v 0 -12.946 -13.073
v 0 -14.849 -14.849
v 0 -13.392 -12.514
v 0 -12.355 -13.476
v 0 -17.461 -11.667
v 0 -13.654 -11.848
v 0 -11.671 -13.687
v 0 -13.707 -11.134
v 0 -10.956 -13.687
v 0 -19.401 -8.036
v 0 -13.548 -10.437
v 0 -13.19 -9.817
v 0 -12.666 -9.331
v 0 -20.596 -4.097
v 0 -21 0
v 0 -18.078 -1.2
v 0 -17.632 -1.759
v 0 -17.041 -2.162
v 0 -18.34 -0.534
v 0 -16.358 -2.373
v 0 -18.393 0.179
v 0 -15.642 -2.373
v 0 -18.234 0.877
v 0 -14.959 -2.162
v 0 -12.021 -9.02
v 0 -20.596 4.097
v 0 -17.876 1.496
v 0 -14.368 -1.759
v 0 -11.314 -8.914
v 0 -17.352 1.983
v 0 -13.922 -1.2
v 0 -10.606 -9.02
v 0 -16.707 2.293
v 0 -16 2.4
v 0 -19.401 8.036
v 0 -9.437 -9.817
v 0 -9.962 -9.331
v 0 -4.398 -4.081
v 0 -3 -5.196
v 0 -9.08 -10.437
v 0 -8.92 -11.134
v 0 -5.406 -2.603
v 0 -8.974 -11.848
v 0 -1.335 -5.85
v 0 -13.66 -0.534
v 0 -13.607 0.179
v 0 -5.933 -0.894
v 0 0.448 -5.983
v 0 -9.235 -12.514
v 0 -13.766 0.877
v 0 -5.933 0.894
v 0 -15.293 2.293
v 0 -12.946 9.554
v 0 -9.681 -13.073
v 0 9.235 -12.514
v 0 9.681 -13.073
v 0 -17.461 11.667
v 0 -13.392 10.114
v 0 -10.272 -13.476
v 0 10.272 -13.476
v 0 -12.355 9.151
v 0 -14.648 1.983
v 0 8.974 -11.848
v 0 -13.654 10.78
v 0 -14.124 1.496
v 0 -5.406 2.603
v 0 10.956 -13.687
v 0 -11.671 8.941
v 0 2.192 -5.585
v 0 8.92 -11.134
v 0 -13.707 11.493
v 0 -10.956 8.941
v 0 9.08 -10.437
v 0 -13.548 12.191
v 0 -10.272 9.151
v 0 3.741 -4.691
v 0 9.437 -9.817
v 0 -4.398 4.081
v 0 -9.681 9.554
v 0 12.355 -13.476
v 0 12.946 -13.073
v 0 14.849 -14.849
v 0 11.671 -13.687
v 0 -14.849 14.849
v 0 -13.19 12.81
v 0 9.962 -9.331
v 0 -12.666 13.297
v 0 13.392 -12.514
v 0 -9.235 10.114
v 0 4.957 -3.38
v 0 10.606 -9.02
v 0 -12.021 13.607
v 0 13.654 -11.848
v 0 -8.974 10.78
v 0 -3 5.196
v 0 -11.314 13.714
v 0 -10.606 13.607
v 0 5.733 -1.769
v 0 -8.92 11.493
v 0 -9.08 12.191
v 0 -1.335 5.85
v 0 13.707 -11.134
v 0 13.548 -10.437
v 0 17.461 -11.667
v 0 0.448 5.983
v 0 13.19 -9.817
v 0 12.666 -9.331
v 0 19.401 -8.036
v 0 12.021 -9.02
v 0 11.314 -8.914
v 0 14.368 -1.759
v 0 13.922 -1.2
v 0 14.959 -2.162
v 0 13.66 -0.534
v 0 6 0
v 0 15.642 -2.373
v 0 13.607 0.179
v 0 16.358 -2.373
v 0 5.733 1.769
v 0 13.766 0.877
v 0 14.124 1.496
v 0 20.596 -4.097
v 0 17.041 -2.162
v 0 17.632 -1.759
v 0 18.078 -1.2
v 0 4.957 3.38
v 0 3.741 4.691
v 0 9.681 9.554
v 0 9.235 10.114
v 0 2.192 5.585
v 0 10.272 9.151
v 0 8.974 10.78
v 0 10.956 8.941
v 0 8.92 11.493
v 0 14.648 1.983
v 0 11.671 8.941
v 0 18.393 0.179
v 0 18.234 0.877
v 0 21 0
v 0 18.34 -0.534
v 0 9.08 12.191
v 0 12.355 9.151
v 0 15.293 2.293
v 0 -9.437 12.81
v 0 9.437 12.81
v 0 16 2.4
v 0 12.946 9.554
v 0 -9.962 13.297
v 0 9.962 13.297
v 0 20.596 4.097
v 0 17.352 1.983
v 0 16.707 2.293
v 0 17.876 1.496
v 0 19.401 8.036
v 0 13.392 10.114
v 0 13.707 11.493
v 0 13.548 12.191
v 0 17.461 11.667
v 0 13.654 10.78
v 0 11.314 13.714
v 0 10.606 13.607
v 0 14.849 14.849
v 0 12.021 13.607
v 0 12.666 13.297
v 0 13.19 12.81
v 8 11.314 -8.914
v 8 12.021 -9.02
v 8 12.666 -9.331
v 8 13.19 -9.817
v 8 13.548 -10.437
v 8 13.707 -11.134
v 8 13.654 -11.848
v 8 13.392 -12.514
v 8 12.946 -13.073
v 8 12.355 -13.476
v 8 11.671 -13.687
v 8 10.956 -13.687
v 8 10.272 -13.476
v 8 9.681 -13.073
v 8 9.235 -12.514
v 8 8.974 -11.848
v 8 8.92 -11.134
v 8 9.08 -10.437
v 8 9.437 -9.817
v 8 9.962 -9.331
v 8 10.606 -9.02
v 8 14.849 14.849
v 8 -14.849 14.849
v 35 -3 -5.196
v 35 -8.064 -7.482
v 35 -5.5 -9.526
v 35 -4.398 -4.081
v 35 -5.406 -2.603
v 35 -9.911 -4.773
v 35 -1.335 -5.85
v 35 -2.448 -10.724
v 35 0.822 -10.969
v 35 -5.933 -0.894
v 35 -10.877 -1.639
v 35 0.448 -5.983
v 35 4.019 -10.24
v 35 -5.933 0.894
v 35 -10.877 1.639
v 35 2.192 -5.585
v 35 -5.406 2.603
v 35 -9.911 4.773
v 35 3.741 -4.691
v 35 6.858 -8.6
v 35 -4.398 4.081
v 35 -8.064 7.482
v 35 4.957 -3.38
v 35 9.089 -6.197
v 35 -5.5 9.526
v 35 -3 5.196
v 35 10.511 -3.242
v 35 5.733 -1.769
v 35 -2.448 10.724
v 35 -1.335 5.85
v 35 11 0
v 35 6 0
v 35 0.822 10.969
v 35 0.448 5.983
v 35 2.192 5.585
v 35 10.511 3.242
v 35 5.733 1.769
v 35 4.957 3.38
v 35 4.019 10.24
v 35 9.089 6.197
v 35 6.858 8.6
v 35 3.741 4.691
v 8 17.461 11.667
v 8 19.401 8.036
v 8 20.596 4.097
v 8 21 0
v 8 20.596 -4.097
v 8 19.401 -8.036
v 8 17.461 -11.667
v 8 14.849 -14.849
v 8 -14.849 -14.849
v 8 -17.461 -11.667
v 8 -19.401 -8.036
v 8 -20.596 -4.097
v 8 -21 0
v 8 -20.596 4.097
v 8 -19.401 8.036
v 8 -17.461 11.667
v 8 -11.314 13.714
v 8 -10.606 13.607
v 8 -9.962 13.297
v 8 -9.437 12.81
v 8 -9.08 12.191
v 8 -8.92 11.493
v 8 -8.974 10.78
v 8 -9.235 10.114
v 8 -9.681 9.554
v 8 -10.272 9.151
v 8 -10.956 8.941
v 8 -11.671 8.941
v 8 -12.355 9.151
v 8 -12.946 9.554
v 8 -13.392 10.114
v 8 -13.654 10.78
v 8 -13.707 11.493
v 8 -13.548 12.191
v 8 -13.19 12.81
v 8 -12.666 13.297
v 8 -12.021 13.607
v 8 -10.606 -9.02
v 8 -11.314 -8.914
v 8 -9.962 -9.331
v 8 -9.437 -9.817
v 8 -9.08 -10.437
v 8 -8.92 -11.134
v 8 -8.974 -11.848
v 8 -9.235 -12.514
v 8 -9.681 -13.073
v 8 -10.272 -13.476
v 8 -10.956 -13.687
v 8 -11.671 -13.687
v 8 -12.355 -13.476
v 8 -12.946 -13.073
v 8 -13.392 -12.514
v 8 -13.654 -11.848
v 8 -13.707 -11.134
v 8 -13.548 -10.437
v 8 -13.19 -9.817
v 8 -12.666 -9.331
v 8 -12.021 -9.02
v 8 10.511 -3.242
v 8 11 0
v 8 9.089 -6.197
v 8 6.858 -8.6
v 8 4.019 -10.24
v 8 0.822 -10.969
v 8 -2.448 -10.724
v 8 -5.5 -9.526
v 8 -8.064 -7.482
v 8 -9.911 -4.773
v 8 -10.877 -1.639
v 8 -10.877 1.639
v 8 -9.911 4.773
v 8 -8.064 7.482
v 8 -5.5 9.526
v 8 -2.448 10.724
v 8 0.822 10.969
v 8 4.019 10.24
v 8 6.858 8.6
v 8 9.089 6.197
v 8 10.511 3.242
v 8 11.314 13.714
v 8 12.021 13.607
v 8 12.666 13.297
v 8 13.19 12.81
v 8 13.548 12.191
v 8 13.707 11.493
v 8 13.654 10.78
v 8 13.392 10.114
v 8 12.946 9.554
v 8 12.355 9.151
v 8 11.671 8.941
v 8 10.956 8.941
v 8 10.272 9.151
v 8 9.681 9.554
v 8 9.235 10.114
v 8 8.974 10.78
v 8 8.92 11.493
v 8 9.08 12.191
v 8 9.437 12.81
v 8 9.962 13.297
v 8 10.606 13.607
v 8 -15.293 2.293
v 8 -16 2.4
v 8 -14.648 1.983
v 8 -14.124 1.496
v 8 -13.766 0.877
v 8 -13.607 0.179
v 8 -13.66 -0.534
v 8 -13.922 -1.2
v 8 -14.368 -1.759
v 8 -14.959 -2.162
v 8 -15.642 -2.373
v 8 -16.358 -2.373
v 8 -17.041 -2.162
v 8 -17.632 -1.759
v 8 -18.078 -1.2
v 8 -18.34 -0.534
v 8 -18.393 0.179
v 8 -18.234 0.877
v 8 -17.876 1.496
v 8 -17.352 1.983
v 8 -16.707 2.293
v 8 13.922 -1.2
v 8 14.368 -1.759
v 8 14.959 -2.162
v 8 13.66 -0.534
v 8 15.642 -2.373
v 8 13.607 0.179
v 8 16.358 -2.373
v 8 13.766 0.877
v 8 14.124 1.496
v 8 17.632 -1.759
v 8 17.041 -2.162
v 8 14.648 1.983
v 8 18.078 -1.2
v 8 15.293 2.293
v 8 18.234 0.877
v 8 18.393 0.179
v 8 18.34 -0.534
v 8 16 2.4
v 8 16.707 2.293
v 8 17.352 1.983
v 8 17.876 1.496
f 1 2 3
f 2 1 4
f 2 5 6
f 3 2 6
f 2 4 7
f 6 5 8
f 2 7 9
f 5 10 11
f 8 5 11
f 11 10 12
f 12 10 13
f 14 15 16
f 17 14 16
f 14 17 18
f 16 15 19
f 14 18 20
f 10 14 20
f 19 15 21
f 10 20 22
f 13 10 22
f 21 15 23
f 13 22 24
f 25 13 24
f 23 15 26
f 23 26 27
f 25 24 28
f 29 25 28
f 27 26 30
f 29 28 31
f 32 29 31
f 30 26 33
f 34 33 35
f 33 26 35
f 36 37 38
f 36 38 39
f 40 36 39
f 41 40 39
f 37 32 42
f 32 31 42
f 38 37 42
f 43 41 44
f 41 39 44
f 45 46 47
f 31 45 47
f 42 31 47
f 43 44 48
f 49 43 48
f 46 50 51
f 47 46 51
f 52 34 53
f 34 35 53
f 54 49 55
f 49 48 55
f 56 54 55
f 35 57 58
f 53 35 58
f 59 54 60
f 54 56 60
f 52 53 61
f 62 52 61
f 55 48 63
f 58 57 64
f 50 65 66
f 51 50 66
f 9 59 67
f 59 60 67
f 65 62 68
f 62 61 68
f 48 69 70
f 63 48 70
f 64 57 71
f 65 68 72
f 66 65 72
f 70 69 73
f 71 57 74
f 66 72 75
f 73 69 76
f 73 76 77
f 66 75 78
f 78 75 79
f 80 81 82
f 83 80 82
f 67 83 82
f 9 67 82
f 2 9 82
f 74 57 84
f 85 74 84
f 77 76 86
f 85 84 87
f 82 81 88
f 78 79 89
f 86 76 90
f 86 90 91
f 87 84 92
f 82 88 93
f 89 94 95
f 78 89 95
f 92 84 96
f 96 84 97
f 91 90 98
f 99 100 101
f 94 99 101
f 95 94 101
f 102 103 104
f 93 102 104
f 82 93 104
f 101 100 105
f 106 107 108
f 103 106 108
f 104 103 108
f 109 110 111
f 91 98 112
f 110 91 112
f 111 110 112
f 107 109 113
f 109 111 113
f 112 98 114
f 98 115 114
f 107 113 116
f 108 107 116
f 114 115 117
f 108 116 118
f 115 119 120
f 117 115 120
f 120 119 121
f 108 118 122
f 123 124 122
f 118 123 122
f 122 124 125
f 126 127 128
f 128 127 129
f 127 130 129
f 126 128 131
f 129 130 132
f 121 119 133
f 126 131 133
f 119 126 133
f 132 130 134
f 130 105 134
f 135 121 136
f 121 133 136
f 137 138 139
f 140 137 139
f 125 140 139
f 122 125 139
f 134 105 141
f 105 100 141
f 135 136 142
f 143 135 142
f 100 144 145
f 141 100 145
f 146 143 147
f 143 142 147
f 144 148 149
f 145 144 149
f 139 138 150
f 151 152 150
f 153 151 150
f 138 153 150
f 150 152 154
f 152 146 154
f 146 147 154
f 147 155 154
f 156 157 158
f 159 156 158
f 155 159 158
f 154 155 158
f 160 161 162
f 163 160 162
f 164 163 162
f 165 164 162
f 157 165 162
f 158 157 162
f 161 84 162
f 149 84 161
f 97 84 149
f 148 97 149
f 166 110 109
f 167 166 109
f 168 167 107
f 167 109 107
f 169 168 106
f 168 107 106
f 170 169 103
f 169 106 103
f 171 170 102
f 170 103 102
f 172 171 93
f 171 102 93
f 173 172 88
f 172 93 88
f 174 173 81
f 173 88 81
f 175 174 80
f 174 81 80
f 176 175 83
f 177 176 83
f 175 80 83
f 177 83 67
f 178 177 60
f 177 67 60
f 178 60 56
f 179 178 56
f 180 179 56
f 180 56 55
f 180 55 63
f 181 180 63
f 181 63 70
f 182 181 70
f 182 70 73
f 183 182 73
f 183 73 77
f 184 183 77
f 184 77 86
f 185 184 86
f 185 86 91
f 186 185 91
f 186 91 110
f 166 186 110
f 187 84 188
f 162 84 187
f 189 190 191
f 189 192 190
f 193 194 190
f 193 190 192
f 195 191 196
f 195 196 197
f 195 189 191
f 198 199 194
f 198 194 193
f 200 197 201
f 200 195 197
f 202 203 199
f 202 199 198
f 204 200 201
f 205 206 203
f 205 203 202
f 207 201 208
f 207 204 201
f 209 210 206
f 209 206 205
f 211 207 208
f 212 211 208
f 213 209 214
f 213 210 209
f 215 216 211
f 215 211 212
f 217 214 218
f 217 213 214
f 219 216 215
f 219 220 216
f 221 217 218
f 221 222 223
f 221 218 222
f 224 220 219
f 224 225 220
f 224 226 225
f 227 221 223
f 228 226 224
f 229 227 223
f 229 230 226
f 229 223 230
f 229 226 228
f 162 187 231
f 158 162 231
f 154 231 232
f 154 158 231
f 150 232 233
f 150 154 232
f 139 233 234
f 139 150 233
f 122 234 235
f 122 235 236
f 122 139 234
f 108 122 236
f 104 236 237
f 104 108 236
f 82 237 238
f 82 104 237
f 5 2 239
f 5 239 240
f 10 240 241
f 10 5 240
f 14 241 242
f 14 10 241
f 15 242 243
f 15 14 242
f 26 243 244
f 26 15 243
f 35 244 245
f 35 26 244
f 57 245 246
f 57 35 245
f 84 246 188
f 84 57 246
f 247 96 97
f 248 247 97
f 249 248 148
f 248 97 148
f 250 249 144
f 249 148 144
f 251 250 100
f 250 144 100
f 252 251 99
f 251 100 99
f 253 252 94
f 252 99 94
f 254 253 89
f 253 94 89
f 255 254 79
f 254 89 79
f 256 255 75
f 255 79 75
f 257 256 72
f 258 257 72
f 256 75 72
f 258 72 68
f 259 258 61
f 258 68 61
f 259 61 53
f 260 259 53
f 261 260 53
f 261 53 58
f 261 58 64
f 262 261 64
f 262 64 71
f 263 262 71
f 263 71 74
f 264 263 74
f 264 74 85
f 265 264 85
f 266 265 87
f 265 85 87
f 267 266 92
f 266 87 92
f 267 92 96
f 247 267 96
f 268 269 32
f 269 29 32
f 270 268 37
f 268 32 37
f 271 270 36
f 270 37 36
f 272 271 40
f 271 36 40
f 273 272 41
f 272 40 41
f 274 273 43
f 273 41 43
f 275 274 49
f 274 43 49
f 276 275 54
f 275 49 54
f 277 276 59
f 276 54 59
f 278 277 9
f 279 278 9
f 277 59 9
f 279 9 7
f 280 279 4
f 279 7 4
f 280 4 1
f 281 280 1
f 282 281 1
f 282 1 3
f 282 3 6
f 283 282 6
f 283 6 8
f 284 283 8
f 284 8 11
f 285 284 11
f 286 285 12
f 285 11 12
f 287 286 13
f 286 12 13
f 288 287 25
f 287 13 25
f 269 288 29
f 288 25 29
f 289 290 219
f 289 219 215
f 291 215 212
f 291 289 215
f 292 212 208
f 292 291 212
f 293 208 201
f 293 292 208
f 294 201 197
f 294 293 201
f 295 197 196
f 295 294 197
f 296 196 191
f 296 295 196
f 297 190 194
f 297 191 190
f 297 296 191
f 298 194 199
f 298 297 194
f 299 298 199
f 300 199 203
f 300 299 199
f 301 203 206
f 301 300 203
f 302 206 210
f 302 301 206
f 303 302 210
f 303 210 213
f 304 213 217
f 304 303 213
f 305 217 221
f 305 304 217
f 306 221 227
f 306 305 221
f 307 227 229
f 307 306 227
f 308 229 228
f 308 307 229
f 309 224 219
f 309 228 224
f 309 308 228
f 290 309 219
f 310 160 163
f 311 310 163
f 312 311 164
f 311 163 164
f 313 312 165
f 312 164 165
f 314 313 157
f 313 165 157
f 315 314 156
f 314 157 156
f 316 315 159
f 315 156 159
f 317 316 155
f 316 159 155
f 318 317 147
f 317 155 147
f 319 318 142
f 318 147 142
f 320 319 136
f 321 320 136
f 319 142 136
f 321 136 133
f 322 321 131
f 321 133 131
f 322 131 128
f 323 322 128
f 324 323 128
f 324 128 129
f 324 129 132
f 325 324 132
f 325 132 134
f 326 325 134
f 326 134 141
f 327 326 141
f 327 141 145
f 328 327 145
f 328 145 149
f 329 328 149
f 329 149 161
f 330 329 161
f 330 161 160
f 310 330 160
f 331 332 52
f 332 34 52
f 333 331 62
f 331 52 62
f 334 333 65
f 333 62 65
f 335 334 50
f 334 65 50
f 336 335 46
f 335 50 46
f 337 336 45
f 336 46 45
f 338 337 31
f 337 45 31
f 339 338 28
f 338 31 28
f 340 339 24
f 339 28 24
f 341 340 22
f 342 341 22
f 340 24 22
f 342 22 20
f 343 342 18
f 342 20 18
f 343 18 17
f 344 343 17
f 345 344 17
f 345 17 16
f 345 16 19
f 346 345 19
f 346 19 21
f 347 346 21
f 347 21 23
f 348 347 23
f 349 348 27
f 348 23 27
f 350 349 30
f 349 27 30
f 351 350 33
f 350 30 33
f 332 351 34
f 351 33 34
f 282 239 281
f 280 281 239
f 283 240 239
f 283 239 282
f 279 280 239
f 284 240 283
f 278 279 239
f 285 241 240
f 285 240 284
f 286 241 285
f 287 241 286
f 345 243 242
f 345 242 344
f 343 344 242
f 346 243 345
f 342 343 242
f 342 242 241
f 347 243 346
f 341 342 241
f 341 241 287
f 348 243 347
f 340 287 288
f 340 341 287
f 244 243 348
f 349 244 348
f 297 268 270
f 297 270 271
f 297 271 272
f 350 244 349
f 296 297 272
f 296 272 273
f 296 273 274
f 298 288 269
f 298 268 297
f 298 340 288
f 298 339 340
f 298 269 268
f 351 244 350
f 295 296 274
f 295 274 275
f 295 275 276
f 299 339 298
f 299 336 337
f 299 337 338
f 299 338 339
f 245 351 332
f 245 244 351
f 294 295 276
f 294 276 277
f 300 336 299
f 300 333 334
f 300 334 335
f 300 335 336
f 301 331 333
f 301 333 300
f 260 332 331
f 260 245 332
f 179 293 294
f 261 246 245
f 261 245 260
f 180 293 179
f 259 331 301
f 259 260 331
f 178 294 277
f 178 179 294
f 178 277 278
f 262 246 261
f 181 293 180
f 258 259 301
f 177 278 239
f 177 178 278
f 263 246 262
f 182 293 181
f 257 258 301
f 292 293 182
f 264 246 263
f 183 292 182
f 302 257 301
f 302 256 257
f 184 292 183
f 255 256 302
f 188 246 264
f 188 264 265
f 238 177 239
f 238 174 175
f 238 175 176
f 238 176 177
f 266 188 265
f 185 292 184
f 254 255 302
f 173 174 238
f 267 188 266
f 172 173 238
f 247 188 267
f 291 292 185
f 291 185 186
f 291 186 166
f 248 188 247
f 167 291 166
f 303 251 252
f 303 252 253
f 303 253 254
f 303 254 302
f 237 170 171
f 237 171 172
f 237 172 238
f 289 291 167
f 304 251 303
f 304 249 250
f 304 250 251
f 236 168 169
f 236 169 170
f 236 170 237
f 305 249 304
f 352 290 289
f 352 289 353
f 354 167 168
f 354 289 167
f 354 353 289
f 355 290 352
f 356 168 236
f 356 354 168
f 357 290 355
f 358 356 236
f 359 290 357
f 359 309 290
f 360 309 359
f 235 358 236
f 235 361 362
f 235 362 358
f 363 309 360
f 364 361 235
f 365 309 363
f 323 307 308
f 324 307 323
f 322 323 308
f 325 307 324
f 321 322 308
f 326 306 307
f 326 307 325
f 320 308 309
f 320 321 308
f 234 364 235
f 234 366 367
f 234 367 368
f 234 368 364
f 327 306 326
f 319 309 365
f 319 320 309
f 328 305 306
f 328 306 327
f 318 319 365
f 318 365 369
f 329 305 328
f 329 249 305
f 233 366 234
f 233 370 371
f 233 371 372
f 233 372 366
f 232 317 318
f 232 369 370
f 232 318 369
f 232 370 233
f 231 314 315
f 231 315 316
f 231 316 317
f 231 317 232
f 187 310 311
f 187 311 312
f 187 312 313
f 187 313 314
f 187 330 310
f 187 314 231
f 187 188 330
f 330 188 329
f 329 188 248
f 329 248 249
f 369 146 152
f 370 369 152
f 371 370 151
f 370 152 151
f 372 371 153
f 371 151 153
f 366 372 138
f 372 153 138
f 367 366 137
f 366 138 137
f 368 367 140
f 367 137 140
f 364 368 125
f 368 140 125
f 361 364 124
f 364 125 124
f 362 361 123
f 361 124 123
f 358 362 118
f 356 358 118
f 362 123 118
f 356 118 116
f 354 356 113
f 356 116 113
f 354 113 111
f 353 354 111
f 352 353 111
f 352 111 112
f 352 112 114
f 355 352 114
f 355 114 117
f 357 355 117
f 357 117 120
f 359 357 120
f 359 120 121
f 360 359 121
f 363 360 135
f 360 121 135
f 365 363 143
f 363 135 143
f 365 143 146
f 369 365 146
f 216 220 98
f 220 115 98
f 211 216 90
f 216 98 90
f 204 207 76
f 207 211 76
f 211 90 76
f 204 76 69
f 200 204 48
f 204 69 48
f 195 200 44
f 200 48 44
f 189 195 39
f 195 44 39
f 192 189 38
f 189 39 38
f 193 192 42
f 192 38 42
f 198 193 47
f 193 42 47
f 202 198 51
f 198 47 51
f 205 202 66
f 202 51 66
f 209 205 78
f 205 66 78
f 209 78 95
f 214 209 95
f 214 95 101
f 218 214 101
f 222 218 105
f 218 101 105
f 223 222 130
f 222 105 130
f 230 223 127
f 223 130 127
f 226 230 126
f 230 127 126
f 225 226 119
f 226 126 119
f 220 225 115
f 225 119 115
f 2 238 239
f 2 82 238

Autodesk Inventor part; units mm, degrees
ref_plane "YZ Plane" through (0, 0, 0) normal (1, 0, 0) x (0, 1, 0)
ref_plane "XZ Plane" through (0, 0, 0) normal (0, 1, 0) x (-1, 0, 0)
ref_plane "XY Plane" through (0, 0, 0) normal (0, 0, 1) x (1, 0, 0)
sketch "Sketch1" plane through (0, 0, 0) normal (0, 0, 1) x (1, 0, 0)
  line L0 (0, 21) -> (0, 6)
  line L1 (0, 0) -> (35, 0) construction
  line L2 (35, 0) -> (35, 6) construction
  line L3 (35, 11) -> (8, 11)
  line L4 (8, 11) -> (8, 21)
  line L5 (8, 21) -> (0, 21)
  line L6 (35, 6) -> (0, 6)
  line L7 (0, 6) -> (0, 0) construction
  line L8 (35, 6) -> (35, 11)
  dimension "d0" = 11
  dimension "d1" = 21
  dimension "d2" = 8
  dimension "d3" = 35
  dimension "d4" = 6
revolve "Revolution1" add sketch "Sketch1" angle 360 about axis through (0, 0, 0) along (1, 0, 0)
sketch "Sketch2" plane through (0, 0, 0) normal (-1, 0, 0) x (0, 0, 1)
  circle A0 centre (0, 0) radius 21 projected
  circle A1 centre (0, 0) radius 21 projected
  line L0 (-14.8492, 14.8492) -> (-14.8492, -14.8492)
  line L1 (14.8492, -14.8492) -> (14.8492, 14.8492)
  line L2 (0, 0) -> (14.8492, 14.8492) construction
  circle A2 centre (0, 16) radius 2.4
  circle A3 centre (11.3137, 11.3137) radius 2.4
  circle A4 centre (11.3137, -11.3137) radius 2.4
  circle A5 centre (0, 0) radius 16 construction
  circle A6 centre (-11.3137, 11.3137) radius 2.4
  circle A7 centre (0, -16) radius 2.4
  circle A8 centre (-11.3137, -11.3137) radius 2.4
  point P0 (-14.8492, -14.8492)
  dimension "d6" = 45
  dimension "d7" = 32
  dimension "d8" = 4.8
extrude "Extrusion1" cut sketch "Sketch2" against normal blind 10 contours A0 L1 | L0 A0 | A2 | A3 | A4 | A6 | A7 | A8
properties part number "SFU1204-Housing"
